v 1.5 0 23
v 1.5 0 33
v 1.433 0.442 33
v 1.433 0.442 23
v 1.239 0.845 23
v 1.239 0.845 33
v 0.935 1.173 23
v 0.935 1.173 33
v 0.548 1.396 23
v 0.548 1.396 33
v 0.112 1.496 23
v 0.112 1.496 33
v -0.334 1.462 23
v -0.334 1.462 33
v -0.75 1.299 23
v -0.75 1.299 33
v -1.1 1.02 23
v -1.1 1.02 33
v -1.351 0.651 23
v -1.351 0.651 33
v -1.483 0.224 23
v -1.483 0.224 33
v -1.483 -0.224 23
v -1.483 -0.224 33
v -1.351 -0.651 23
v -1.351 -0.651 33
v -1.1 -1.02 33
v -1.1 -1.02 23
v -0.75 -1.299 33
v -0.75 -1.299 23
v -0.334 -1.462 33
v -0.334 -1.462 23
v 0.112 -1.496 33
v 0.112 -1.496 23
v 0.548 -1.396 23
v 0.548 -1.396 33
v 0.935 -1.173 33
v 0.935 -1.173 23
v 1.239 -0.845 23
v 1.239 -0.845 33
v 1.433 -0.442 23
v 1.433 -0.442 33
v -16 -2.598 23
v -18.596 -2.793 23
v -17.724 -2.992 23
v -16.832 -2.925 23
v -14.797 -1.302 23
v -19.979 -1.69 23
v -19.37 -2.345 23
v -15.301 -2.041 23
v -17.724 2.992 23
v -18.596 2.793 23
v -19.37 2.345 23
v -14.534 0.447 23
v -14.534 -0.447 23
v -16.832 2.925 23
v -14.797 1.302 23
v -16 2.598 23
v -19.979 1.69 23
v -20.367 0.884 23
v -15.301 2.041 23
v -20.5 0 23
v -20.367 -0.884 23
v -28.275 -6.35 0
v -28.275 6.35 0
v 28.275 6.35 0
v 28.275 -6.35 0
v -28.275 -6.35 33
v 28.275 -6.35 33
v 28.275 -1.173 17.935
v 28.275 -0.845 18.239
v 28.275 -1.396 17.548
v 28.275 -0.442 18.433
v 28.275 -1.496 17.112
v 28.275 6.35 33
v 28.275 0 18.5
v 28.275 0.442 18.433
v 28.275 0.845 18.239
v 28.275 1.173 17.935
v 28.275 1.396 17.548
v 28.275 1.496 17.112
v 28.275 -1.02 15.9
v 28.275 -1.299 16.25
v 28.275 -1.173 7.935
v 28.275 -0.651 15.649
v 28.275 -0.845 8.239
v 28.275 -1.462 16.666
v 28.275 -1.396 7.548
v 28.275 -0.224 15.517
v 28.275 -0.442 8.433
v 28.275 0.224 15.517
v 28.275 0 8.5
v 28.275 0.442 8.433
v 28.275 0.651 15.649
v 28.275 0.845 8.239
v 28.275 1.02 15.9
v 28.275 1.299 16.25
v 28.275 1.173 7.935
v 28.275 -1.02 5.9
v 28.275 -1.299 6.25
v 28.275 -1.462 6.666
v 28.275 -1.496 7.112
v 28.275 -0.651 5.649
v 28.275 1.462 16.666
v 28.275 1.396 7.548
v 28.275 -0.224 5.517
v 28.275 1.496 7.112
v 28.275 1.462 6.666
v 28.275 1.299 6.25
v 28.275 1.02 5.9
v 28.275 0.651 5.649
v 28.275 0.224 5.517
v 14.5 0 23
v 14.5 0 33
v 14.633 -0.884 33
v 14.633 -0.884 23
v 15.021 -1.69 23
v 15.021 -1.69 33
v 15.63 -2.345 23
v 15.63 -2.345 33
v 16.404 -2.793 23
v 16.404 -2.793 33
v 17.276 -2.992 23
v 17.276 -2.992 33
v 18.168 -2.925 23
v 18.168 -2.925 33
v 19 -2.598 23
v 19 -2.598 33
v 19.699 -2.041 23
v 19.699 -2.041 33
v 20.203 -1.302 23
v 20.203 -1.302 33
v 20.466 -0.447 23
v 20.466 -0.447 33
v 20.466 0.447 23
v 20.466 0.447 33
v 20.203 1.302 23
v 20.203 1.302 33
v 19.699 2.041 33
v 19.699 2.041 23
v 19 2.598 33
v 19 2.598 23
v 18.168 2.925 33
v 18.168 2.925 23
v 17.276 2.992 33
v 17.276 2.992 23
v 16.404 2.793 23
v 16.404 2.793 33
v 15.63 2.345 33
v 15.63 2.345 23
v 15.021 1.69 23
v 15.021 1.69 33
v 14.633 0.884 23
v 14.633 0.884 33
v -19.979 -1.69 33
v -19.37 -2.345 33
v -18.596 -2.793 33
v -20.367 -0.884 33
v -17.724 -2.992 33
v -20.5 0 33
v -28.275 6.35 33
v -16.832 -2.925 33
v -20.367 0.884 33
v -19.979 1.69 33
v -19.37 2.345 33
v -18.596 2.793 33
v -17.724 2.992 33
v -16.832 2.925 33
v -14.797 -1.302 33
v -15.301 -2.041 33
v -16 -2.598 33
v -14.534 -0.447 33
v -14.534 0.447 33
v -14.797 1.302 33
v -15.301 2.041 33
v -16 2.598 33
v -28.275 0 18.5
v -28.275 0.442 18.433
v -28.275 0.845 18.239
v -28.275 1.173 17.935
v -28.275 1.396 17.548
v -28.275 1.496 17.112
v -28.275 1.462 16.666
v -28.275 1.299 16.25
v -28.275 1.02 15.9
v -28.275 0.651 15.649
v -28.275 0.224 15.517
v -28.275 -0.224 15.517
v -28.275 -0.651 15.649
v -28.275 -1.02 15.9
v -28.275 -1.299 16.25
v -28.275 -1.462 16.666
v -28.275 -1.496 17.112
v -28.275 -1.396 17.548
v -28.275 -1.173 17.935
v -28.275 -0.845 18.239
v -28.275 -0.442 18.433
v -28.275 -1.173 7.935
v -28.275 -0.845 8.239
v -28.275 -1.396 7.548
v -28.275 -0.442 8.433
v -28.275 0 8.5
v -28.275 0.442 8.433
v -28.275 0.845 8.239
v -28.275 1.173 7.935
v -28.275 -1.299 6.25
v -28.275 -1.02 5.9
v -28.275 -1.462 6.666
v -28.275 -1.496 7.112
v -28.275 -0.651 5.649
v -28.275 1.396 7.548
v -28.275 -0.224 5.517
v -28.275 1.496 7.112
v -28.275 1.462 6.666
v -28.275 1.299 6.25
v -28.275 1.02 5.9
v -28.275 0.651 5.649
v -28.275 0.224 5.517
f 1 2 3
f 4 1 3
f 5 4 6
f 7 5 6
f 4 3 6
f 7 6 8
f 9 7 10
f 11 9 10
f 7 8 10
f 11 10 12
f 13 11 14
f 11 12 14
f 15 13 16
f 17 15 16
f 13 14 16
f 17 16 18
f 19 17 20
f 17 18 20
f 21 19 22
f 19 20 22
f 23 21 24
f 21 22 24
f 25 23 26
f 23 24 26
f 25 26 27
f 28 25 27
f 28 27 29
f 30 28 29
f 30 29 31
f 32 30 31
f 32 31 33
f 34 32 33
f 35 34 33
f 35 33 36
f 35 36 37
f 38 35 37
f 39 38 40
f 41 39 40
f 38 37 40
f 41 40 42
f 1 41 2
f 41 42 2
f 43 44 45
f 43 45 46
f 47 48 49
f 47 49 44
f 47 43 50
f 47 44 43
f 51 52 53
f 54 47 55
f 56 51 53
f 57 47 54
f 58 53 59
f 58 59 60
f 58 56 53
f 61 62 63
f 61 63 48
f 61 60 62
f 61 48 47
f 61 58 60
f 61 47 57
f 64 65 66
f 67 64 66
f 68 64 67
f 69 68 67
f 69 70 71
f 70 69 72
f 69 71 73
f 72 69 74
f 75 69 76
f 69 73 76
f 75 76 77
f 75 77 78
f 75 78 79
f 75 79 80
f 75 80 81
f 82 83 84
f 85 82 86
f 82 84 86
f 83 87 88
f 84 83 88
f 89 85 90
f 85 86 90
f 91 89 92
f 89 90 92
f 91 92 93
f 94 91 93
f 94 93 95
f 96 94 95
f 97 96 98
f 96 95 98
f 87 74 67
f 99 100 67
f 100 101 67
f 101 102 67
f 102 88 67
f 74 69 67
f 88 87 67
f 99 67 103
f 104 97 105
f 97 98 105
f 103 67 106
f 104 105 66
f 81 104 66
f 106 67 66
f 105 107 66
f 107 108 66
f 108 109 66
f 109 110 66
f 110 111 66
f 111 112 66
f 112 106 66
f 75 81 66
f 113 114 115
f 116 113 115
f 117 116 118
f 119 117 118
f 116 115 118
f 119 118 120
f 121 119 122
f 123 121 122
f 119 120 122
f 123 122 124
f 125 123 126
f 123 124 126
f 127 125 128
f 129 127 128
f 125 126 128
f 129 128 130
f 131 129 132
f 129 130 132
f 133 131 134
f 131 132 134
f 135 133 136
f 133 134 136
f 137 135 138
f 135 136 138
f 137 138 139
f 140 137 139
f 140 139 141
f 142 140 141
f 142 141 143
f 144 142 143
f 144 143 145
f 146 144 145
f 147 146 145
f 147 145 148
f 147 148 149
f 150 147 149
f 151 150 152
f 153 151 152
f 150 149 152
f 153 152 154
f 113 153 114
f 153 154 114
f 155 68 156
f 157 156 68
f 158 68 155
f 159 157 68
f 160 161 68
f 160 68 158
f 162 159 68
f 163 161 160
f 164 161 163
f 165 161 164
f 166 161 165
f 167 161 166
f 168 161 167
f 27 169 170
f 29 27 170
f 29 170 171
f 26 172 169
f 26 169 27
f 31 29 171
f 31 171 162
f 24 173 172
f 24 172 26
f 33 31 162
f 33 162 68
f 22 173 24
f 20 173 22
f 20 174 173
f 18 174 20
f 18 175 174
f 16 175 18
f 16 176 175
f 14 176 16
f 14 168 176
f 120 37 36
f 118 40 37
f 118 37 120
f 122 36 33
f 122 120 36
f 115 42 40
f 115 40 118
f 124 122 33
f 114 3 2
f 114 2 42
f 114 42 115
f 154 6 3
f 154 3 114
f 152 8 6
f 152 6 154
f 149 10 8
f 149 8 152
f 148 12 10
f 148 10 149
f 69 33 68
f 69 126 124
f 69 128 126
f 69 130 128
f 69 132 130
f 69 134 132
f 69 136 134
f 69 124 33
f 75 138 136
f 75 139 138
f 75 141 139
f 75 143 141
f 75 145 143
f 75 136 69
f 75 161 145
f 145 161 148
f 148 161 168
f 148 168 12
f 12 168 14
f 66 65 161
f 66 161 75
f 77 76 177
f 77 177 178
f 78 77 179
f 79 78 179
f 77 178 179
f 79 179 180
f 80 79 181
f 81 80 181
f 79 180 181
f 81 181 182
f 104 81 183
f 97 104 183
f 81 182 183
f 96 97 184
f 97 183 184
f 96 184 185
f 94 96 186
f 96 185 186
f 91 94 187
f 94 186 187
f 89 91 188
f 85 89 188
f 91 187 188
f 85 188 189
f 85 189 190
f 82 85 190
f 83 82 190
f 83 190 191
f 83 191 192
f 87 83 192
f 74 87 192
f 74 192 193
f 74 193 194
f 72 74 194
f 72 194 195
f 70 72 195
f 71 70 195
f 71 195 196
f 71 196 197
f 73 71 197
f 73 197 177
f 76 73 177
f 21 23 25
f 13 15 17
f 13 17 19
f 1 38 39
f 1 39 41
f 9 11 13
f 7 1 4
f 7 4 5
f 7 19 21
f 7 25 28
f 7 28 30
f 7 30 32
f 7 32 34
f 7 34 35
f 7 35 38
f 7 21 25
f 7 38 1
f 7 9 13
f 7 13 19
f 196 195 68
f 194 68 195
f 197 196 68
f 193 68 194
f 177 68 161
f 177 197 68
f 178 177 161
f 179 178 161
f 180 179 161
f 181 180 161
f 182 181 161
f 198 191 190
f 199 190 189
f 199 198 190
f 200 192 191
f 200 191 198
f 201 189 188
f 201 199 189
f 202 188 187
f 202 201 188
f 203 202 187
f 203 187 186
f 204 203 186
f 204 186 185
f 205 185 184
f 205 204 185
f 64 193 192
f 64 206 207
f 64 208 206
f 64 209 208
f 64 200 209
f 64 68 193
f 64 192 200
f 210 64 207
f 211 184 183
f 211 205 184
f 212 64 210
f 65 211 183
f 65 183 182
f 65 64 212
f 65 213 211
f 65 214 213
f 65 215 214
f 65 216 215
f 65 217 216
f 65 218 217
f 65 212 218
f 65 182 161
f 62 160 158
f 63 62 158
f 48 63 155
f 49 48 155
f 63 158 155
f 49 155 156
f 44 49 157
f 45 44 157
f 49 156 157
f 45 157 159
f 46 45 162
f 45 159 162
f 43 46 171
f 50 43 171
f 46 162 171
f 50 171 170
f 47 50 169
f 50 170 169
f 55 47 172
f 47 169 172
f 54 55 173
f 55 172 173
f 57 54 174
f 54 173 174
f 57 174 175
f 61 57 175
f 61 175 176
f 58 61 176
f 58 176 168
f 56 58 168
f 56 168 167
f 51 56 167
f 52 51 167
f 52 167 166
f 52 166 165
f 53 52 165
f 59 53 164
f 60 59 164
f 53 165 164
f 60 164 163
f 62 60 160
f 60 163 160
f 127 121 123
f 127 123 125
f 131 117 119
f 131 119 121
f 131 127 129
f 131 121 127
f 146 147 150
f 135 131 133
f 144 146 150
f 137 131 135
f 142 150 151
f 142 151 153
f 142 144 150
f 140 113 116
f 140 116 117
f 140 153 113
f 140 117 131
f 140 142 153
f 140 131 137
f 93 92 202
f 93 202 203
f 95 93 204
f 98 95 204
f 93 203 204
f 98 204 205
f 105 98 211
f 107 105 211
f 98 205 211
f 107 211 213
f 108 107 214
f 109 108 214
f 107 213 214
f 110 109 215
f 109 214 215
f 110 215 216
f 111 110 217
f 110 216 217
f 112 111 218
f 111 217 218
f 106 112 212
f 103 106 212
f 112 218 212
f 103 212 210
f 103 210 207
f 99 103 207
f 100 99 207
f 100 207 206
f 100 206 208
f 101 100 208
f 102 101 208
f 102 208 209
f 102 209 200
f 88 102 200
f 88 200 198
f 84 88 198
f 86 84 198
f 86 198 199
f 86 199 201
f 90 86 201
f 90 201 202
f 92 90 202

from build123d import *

# Parameters (mm, degrees)
SKETCH1_W           = 56.55
SKETCH1_H           = 12.7
BOSS_EXTRUDE1_DEPTH = 33
SKETCH2_R           = 1.5
CUT_EXTRUDE1_DEPTH  = 10
CUT_EXTRUDE2_DEPTH  = 66.781646376


with BuildPart() as part:
    # Sketch1 → Boss-Extrude1 (new body)
    with BuildSketch(Plane.XY):
        Rectangle(SKETCH1_W, SKETCH1_H)
    extrude(amount=BOSS_EXTRUDE1_DEPTH)

    # Sketch2 → Cut-Extrude1 (cut)
    with BuildSketch(Plane.XY.offset(33)):
        with BuildLine():
            Line((-20.5, 0), (-17.5, 0))
            Line((-17.5, 0), (-14.5, 0))
            ThreePointArc((-14.5, 0), (-17.5, 3), (-20.5, 0))
        make_face()
        with BuildLine():
            Line((-14.5, 0), (-17.5, 0))
            Line((-17.5, 0), (-20.5, 0))
            ThreePointArc((-20.5, 0), (-17.5, -3), (-14.5, 0))
        make_face()
        with BuildLine():
            ThreePointArc((20.5, 0), (17.5, 3), (14.5, 0))
            Line((14.5, 0), (17.5, 0))
            Line((17.5, 0), (20.5, 0))
        make_face()
        with BuildLine():
            Line((17.5, 0), (14.5, 0))
            ThreePointArc((14.5, 0), (17.5, -3), (20.5, 0))
            Line((20.5, 0), (17.5, 0))
        make_face()
        Circle(SKETCH2_R)
    extrude(amount=-CUT_EXTRUDE1_DEPTH, mode=Mode.SUBTRACT)

    # Sketch3 → Cut-Extrude2 (cut, through all)
    with BuildSketch(Plane.ZY.offset(28.275)):
        with BuildLine():
            ThreePointArc((5.5, 0), (7, -1.5), (8.5, 0))
            Line((8.5, 0), (5.5, 0))
        make_face()
        with BuildLine():
            Line((5.5, 0), (8.5, 0))
            ThreePointArc((8.5, 0), (7, 1.5), (5.5, 0))
        make_face()
        with BuildLine():
            ThreePointArc((15.5, 0), (17, -1.5), (18.5, 0))
            Line((18.5, 0), (15.5, 0))
        make_face()
        with BuildLine():
            Line((15.5, 0), (18.5, 0))
            ThreePointArc((18.5, 0), (17, 1.5), (15.5, 0))
        make_face()
    extrude(amount=-CUT_EXTRUDE2_DEPTH, mode=Mode.SUBTRACT)


solid = part.part
